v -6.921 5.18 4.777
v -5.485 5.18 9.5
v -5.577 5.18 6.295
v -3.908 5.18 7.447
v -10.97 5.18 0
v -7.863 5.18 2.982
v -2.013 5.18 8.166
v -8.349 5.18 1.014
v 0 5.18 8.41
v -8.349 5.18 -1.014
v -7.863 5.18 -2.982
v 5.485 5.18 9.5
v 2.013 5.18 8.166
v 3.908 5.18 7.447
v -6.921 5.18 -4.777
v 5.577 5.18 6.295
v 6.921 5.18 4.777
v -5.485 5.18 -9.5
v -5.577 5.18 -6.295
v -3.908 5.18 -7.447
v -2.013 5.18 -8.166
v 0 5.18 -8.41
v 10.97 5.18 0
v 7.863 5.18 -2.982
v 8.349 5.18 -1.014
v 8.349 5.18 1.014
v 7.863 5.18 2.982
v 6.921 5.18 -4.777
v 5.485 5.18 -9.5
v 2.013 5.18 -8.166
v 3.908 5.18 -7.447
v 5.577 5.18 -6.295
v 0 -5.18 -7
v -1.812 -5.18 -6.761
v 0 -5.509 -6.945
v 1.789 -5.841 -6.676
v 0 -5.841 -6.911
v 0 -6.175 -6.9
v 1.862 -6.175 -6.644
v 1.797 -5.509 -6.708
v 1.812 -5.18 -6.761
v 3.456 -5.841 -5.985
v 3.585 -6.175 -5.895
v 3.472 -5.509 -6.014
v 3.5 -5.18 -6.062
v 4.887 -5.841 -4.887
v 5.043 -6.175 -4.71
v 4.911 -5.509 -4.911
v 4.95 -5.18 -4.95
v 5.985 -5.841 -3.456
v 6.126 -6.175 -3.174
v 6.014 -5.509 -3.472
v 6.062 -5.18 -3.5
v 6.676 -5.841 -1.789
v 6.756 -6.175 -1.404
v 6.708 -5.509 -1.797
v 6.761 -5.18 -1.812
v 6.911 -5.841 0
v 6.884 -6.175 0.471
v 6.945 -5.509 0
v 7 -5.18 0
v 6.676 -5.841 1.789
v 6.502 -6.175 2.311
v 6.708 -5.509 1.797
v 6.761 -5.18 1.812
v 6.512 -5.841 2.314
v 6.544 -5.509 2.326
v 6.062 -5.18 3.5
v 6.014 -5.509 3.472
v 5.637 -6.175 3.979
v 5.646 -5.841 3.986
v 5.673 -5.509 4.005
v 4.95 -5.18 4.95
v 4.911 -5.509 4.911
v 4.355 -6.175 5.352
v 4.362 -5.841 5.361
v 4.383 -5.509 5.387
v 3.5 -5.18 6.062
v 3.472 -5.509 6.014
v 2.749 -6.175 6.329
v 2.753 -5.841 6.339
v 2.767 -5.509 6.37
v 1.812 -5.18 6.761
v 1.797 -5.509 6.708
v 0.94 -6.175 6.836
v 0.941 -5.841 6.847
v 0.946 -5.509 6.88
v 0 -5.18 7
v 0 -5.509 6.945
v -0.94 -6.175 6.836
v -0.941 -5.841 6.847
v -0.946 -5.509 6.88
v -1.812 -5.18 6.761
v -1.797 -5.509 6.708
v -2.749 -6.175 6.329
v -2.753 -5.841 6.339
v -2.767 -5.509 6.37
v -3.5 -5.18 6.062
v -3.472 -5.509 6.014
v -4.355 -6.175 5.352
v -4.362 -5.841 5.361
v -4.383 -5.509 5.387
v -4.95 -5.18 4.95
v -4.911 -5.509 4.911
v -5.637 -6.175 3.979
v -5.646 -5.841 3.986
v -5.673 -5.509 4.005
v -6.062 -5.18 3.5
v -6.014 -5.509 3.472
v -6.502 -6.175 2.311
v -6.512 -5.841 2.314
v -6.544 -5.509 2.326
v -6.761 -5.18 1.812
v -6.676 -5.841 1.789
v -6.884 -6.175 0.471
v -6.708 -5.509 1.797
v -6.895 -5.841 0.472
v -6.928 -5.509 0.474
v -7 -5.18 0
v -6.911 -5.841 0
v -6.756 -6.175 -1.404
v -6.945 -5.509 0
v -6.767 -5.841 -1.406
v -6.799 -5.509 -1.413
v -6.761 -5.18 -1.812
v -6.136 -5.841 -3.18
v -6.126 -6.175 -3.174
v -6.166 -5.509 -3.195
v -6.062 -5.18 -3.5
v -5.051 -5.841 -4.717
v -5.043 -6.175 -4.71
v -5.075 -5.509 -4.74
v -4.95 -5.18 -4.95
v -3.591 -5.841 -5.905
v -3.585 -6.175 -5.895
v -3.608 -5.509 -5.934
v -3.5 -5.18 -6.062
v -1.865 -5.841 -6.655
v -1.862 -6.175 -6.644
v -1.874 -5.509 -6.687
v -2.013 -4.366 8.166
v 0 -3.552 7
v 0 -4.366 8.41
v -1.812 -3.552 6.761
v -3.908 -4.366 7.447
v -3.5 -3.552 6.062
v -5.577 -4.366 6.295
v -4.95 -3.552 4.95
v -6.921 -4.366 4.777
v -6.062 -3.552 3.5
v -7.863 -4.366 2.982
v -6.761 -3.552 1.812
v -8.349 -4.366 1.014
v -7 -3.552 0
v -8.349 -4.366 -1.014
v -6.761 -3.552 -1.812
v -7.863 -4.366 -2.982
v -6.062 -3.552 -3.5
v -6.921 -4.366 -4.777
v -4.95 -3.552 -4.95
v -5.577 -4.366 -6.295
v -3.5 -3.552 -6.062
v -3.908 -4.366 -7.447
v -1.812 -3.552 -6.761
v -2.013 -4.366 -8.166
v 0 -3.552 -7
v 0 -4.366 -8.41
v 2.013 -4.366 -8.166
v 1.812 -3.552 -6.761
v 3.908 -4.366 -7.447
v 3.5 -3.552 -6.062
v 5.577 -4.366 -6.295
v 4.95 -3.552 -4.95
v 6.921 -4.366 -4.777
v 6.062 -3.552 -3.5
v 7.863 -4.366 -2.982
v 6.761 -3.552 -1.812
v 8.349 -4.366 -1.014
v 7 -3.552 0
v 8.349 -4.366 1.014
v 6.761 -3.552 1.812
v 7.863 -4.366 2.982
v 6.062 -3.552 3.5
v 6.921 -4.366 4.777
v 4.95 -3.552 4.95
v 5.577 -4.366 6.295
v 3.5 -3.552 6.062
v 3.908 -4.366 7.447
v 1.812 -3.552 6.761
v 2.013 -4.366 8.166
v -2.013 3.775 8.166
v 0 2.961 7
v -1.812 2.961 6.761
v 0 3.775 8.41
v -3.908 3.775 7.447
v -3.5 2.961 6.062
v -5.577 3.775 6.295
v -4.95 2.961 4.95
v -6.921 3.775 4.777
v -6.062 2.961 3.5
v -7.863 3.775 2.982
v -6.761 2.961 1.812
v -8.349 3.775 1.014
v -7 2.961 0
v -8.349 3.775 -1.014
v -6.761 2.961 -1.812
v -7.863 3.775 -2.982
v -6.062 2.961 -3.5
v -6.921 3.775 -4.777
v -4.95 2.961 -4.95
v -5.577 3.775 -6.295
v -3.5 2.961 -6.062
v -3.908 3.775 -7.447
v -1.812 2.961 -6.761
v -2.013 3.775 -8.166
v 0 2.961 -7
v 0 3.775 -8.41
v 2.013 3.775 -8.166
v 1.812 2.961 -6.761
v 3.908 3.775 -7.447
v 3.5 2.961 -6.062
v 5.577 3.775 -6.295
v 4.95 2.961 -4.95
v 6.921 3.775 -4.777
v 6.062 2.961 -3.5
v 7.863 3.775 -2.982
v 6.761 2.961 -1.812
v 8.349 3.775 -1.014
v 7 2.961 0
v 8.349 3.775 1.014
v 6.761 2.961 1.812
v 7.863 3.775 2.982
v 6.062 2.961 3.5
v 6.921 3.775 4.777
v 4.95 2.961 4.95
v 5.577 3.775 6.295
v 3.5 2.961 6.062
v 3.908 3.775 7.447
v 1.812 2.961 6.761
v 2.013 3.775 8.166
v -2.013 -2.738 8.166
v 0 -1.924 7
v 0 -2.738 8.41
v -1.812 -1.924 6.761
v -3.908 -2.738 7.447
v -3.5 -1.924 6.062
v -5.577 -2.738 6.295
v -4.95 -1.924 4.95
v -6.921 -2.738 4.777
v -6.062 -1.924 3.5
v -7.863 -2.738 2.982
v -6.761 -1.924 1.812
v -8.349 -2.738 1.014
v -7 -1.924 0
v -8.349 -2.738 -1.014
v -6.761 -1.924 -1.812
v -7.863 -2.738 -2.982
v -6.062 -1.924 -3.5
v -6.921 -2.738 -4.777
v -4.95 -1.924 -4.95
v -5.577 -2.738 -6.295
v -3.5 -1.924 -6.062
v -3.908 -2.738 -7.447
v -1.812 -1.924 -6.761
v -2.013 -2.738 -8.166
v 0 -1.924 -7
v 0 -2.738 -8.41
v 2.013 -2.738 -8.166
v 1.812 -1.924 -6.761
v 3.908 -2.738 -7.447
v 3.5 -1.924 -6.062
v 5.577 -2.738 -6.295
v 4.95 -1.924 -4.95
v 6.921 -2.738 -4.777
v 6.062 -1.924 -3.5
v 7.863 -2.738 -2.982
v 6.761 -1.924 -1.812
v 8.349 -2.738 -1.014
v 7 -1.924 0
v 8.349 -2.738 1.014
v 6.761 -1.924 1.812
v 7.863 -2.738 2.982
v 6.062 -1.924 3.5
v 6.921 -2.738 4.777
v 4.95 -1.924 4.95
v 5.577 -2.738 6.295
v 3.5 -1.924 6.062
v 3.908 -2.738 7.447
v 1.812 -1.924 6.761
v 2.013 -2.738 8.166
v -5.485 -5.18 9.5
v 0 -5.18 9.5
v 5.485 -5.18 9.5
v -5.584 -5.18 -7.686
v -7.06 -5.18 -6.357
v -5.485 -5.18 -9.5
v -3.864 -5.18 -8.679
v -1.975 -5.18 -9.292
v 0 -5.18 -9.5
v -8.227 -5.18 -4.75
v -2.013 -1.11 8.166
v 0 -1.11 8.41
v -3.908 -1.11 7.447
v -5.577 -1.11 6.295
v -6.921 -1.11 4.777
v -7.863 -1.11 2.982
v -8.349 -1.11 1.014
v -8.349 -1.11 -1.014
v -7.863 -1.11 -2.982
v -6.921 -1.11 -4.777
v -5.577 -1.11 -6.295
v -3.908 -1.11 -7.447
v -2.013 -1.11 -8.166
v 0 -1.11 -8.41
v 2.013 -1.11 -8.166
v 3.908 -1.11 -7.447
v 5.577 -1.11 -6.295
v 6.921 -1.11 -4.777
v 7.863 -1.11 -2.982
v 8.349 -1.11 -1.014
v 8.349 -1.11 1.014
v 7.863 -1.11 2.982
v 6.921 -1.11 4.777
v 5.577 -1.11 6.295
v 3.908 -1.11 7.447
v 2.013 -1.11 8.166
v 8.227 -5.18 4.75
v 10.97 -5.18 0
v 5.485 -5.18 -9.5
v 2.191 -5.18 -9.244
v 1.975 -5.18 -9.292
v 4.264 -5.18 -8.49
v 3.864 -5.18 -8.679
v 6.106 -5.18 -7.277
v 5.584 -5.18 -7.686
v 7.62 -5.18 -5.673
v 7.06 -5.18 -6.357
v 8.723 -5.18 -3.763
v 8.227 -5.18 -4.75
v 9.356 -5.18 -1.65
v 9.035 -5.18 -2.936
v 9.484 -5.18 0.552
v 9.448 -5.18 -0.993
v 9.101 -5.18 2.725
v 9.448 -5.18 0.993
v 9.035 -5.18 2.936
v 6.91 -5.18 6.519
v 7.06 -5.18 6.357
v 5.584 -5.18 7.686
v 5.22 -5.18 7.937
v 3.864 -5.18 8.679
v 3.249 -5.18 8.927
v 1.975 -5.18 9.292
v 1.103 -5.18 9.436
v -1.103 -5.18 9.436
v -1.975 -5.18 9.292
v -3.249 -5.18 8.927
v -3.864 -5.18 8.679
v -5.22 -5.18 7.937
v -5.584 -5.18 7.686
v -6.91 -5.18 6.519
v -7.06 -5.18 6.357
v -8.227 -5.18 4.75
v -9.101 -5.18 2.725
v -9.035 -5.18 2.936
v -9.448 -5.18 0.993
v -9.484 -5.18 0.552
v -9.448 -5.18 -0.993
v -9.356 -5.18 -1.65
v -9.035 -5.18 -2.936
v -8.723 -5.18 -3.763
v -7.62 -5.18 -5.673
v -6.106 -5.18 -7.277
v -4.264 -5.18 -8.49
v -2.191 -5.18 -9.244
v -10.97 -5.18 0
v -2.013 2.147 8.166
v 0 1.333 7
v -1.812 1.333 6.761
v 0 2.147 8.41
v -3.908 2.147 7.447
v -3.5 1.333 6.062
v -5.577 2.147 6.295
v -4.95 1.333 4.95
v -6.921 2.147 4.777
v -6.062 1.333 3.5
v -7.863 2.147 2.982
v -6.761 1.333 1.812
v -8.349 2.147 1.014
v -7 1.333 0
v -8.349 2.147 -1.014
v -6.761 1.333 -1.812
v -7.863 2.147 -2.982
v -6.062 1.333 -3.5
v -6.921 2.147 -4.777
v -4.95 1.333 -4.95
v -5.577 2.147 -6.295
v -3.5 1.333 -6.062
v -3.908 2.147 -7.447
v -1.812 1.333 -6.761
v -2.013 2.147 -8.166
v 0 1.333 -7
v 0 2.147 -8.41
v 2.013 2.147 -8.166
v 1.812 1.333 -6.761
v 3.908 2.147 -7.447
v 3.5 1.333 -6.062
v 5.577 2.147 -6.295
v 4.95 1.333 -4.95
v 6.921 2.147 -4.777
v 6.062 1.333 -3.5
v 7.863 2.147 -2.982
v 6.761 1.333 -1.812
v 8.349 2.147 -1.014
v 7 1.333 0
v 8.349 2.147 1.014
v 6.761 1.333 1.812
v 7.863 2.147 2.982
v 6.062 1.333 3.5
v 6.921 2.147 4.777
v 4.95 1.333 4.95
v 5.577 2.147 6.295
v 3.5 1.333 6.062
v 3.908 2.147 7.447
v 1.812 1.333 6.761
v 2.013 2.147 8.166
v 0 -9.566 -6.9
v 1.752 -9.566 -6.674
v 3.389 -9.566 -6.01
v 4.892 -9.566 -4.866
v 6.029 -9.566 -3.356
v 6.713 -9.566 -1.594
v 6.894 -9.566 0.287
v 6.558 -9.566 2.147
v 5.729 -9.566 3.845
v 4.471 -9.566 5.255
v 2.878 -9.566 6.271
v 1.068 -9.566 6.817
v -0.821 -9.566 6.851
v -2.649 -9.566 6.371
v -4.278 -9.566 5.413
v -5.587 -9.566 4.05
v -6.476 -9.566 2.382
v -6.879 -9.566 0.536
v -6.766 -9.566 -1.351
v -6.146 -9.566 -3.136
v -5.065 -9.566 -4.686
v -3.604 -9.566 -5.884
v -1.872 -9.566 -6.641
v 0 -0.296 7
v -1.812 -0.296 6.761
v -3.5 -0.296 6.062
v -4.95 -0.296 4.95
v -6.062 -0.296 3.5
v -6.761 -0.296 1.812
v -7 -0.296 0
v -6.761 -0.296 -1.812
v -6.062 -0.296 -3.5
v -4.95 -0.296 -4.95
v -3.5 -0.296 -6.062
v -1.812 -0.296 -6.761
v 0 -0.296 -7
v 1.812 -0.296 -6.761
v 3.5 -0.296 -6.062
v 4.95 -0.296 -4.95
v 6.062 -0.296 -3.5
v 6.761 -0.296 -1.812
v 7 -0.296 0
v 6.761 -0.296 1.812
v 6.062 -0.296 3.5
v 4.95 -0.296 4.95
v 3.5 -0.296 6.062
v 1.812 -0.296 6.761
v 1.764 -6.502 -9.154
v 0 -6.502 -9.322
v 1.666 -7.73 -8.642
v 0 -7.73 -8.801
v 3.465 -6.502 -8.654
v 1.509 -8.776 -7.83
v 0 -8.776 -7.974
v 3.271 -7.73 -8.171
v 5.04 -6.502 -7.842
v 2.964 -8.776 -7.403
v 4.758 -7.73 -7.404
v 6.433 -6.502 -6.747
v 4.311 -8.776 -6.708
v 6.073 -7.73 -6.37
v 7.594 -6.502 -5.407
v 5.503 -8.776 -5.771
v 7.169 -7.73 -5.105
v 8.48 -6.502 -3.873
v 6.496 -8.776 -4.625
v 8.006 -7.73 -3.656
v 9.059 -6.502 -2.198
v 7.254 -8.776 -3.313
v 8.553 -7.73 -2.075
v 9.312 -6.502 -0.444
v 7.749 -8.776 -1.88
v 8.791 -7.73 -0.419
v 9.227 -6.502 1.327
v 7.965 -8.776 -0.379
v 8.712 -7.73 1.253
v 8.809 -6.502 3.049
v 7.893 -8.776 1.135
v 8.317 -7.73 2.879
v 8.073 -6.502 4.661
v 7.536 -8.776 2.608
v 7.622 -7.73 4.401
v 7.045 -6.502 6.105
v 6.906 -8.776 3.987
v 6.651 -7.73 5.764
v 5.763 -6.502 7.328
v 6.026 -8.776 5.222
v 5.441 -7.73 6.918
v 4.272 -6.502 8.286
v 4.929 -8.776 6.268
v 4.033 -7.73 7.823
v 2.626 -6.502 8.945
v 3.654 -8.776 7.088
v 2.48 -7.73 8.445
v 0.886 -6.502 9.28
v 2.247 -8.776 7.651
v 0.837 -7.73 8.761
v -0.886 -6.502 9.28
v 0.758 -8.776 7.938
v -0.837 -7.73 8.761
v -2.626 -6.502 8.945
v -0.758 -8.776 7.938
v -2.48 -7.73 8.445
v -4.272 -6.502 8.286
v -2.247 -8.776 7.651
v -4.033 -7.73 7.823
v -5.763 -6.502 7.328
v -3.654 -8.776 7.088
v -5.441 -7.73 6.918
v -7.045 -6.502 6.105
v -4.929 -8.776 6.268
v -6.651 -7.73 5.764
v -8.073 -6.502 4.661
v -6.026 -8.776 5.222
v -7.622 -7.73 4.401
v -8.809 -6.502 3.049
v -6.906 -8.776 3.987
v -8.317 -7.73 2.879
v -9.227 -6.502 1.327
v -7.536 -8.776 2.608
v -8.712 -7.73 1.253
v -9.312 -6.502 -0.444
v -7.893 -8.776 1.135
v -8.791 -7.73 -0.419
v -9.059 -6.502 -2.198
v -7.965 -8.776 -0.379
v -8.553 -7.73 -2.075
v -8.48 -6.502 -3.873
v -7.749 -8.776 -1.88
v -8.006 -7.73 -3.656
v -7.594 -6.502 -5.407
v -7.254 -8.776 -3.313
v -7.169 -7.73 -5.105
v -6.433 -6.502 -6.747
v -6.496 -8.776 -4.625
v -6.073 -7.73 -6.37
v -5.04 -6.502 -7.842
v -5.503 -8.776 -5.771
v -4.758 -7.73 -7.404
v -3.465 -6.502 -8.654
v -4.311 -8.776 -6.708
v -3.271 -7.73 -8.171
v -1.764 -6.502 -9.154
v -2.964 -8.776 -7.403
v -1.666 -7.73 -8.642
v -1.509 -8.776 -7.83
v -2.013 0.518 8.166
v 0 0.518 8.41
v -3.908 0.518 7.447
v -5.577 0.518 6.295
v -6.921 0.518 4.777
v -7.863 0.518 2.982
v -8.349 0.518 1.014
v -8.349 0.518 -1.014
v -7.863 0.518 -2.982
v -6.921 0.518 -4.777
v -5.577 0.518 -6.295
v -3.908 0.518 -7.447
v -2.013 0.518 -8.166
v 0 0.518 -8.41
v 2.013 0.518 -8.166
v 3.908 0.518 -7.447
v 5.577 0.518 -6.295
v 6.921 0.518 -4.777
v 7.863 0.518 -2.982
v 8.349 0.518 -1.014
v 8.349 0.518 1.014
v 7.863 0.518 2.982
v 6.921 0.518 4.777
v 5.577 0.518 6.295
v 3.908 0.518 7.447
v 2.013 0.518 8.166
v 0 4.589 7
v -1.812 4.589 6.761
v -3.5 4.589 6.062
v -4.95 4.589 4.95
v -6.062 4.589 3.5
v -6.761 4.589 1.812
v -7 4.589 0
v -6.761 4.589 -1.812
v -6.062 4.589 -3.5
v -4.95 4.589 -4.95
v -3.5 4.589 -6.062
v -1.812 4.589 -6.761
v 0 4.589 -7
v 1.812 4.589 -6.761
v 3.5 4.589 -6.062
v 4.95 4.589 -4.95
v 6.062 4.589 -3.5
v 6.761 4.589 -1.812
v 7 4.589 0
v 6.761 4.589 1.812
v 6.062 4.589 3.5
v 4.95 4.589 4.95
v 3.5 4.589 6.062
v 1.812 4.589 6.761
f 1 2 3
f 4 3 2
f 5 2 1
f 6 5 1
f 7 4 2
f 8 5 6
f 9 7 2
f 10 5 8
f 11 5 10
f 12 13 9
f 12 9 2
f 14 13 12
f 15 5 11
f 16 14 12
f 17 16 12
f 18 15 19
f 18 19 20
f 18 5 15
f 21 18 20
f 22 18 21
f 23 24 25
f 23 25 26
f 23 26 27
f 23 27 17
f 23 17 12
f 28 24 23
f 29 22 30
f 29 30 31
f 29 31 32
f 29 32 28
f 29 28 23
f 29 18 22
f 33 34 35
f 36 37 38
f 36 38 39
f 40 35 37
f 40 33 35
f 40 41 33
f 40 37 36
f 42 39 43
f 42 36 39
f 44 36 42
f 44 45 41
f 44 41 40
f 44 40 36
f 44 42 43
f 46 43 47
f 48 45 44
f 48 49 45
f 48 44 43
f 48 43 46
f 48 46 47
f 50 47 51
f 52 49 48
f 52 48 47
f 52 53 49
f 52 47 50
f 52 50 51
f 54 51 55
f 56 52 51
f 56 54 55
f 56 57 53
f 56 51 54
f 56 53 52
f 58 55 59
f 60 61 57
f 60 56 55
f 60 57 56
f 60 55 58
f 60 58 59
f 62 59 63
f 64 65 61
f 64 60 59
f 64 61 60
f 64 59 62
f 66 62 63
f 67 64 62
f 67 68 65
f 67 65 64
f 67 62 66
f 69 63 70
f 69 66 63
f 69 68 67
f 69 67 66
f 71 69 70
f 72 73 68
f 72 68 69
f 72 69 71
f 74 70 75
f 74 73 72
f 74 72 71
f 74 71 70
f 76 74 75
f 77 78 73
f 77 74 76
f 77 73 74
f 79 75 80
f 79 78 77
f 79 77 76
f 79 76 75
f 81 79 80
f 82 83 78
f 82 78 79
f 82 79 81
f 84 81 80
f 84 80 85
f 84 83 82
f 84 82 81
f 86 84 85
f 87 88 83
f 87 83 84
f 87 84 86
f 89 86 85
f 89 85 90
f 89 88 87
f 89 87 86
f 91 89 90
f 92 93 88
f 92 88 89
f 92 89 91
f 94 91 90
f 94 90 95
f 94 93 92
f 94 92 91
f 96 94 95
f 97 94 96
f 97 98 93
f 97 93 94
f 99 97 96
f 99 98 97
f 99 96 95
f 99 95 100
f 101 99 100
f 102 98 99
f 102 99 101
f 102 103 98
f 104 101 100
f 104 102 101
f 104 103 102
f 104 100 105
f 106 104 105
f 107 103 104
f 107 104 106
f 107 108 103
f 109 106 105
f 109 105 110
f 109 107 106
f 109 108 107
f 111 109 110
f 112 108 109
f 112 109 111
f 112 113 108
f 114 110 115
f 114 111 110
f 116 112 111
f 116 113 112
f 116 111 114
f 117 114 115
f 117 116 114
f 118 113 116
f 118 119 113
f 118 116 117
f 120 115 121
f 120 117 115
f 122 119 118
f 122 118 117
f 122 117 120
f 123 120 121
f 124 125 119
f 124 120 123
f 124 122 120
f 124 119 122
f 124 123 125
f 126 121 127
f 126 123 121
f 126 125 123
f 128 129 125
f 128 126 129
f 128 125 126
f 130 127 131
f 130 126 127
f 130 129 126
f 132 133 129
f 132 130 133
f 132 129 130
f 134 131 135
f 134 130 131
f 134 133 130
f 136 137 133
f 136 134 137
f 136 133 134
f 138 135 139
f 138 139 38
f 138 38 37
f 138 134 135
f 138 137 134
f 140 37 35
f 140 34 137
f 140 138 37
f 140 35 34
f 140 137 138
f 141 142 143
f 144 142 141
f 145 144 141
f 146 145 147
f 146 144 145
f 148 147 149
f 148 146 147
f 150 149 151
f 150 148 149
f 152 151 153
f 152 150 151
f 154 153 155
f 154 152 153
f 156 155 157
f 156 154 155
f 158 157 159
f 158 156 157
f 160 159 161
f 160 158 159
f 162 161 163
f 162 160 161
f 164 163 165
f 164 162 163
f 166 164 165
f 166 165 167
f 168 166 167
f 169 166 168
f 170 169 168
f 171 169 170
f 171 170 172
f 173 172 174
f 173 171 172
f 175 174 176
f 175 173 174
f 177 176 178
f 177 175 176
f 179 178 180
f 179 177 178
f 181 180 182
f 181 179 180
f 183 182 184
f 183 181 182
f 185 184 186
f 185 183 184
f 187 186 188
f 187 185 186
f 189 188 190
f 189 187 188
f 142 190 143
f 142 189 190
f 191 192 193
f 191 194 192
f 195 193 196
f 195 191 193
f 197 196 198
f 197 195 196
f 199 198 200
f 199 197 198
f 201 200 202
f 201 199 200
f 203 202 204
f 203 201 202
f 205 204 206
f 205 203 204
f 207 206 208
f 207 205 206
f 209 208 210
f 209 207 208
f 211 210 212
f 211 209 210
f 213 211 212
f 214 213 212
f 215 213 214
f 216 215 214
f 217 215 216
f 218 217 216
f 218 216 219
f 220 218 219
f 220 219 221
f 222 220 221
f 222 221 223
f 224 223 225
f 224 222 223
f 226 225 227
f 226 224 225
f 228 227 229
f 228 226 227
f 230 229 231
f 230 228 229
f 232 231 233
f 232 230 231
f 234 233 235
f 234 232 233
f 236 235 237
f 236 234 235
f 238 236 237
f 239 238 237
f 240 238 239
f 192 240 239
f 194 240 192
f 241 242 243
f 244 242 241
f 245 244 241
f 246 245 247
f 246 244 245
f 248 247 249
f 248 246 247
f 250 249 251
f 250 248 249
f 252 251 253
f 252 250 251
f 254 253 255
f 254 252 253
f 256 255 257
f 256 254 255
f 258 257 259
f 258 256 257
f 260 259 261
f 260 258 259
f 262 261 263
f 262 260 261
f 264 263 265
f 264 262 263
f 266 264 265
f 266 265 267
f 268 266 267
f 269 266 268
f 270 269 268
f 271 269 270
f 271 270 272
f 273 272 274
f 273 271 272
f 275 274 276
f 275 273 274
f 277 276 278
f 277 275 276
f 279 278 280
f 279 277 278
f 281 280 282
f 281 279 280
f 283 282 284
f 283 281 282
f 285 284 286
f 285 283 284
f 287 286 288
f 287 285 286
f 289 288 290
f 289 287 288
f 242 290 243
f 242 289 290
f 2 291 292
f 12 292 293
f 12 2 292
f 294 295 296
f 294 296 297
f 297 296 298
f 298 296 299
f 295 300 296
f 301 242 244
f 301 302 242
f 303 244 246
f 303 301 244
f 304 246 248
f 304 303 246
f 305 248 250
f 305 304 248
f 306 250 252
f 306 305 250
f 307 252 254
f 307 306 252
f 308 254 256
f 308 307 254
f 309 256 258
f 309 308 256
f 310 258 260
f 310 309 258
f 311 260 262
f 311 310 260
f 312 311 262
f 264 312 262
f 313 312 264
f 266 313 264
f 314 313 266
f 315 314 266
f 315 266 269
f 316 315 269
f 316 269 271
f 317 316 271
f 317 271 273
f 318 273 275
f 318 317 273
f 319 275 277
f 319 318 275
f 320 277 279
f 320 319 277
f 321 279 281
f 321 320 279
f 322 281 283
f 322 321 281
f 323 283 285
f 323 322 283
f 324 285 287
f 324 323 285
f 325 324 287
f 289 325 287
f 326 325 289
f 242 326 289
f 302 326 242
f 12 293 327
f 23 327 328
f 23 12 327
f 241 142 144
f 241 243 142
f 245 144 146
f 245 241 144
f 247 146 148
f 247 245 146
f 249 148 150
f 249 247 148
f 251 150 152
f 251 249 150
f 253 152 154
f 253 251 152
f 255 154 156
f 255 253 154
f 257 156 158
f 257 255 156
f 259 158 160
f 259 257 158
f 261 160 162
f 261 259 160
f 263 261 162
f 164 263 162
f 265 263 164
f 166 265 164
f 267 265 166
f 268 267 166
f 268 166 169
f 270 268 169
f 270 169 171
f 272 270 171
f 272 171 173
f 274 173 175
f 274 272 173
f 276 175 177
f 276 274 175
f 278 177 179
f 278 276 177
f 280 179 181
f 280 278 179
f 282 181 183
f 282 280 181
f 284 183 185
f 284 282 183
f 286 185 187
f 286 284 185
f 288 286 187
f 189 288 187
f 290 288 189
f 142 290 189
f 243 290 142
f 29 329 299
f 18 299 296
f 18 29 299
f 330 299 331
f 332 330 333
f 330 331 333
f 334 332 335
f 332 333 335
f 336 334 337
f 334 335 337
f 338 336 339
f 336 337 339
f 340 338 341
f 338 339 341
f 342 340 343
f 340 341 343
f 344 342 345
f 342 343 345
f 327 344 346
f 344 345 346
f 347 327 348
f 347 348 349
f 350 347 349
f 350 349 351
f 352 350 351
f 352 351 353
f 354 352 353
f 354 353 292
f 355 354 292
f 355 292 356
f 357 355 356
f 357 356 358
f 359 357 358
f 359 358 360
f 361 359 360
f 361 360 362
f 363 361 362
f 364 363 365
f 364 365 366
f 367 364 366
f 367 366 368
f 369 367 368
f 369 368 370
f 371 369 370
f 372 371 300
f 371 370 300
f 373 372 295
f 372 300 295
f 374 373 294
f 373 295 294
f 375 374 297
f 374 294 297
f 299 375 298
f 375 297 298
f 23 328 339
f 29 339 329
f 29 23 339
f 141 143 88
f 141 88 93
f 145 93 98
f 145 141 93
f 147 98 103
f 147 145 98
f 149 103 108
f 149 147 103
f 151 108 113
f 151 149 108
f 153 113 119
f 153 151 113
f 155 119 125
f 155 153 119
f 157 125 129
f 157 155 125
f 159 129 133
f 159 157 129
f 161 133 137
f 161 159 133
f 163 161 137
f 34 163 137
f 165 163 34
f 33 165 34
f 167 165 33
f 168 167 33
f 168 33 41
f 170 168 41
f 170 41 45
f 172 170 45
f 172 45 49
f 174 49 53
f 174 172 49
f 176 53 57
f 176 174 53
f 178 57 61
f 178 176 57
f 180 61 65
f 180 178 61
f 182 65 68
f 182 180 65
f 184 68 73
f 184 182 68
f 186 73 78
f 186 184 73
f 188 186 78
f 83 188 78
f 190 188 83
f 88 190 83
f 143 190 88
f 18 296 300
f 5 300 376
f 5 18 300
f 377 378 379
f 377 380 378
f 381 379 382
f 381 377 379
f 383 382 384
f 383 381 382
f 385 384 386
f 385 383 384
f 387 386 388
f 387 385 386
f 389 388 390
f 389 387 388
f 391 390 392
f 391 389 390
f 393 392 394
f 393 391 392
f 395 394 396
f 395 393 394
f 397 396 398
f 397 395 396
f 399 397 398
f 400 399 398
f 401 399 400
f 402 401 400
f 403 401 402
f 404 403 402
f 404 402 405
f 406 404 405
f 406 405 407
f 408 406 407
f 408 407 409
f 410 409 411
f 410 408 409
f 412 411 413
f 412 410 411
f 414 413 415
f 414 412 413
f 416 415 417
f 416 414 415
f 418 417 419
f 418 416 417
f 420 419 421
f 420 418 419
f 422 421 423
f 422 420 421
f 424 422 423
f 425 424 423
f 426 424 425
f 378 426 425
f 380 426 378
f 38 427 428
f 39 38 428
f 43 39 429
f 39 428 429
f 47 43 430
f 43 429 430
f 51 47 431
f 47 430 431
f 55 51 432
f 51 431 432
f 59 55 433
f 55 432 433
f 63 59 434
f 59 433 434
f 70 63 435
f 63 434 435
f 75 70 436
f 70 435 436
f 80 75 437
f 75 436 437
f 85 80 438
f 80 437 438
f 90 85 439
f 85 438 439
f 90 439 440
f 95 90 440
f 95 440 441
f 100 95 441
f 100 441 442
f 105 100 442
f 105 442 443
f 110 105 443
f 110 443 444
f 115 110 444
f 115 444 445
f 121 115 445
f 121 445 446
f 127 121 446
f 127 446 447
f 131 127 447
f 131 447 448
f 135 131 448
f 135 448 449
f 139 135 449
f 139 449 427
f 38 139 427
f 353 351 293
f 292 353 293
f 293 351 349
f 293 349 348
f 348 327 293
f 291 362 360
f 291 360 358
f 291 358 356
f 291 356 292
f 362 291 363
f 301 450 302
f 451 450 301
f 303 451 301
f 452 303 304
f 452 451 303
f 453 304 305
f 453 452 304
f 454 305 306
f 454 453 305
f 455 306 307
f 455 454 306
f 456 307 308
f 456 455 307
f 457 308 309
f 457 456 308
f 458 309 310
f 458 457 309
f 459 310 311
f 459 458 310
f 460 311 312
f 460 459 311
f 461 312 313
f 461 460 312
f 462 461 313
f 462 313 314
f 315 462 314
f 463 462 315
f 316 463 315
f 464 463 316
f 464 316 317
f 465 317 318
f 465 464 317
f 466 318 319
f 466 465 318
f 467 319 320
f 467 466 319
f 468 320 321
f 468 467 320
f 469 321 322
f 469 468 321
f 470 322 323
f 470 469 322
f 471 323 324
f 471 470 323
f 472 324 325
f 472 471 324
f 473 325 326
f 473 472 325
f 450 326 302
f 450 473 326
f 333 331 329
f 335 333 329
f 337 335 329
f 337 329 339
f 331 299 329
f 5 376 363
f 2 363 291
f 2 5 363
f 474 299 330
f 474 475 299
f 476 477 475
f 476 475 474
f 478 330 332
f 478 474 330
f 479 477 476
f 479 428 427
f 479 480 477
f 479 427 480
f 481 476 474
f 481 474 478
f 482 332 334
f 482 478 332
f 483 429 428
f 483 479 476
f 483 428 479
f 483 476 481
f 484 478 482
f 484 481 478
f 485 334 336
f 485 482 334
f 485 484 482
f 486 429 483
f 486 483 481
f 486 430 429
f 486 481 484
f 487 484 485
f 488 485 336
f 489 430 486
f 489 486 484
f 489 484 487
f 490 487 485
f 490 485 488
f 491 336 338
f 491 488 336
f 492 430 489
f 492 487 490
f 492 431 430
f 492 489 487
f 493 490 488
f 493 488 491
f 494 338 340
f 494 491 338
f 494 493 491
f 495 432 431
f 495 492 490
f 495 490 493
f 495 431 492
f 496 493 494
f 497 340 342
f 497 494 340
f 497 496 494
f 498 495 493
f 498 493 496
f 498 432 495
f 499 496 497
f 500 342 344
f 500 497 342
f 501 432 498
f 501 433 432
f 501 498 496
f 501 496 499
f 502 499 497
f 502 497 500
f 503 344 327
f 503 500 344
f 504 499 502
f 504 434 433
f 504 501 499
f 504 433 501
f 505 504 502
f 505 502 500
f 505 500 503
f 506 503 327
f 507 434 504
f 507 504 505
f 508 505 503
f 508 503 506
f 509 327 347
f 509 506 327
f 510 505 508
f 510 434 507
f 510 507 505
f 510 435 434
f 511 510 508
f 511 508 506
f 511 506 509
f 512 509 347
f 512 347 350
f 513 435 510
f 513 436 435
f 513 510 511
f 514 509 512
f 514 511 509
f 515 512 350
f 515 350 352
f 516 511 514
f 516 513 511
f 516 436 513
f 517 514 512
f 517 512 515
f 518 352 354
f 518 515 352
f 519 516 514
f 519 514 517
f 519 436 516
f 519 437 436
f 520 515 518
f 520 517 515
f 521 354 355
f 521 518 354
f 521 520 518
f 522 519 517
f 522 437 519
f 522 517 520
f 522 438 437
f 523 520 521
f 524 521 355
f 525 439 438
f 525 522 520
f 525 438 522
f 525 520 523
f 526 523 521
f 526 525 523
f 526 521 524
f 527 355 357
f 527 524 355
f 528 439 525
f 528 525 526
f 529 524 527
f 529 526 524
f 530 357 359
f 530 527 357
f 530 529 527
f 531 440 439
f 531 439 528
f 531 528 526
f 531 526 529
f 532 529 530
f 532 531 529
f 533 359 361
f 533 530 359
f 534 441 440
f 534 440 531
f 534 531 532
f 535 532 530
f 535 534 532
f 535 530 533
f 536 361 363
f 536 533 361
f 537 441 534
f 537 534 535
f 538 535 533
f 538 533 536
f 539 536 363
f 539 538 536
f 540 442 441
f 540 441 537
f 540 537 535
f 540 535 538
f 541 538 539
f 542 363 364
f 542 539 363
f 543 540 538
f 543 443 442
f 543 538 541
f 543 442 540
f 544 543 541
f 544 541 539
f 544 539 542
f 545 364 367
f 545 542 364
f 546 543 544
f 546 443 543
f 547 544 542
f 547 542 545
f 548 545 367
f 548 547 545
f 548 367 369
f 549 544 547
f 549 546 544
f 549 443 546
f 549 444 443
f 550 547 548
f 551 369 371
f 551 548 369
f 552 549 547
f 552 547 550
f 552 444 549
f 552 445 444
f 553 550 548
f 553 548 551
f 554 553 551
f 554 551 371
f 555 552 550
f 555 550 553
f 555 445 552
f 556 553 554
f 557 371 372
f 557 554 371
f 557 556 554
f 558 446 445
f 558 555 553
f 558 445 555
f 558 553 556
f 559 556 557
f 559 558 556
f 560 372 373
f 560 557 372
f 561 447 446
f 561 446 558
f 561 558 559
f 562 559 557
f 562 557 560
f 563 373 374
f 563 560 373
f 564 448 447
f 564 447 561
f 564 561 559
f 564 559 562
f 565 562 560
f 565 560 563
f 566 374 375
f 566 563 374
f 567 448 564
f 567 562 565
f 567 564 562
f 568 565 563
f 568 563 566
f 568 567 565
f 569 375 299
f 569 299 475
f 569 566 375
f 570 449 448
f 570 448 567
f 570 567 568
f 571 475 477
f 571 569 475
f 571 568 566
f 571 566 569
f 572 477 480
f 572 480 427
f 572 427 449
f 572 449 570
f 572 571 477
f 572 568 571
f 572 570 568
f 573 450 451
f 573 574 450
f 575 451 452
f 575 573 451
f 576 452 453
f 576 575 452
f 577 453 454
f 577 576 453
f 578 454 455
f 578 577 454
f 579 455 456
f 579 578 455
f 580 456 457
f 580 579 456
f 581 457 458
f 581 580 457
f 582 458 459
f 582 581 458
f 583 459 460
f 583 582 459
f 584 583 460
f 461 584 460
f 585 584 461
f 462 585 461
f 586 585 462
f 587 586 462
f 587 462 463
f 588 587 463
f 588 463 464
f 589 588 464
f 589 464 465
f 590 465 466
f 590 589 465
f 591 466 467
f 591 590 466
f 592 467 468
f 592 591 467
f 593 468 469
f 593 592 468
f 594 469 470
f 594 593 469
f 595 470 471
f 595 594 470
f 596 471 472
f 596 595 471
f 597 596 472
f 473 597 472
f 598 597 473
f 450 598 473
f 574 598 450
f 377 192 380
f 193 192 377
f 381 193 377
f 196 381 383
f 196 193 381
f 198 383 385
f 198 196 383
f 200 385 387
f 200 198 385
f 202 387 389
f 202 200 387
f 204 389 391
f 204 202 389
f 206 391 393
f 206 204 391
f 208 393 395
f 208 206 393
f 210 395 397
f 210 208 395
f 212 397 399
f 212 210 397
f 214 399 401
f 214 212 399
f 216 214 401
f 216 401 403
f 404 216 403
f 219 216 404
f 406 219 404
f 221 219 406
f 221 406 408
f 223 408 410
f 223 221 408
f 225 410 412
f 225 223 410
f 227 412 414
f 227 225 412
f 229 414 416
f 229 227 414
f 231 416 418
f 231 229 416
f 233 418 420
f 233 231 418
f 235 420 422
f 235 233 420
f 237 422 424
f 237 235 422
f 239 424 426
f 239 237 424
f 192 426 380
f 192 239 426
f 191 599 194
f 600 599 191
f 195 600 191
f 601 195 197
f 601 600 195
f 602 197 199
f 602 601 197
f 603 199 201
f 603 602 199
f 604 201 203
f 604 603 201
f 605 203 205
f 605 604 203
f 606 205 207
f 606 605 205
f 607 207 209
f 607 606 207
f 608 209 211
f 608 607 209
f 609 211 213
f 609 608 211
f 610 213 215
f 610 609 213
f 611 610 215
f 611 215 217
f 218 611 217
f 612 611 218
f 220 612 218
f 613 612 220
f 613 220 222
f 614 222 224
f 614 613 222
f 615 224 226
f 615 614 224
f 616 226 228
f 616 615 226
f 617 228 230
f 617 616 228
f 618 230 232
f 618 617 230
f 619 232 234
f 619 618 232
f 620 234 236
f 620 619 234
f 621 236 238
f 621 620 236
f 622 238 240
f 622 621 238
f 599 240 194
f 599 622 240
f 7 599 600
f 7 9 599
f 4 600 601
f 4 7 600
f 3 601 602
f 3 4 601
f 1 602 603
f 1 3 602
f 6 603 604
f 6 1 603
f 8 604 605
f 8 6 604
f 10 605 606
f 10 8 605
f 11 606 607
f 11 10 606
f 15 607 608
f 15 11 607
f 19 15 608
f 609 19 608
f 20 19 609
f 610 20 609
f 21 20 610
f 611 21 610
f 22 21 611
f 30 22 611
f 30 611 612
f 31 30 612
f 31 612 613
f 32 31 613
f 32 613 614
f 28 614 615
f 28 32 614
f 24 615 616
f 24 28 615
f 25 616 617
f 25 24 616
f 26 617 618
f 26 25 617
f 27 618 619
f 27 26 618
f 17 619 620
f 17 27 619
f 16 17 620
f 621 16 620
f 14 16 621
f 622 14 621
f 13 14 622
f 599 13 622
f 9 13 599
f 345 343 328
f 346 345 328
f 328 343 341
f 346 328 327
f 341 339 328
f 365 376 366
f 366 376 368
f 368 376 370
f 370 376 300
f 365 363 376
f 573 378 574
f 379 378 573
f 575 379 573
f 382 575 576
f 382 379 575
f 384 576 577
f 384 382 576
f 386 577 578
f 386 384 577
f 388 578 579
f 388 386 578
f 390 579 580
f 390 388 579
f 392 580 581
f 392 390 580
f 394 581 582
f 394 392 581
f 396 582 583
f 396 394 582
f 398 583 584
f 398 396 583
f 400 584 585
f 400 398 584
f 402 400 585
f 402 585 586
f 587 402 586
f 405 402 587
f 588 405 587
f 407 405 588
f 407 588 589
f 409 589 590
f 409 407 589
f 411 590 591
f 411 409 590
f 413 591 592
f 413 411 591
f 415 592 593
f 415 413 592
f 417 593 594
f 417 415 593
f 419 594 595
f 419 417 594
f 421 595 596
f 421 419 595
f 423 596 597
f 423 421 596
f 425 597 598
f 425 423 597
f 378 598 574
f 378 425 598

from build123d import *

# Parameters (mm, degrees)
BOSS_EXTRUDE1_DEPTH = 5.18
SKETCH3_R           = 9.5
BOSS_EXTRUDE2_DEPTH = 5
FILLET3_R           = 5
SKETCH4_R           = 6.9
CUT_EXTRUDE1_DEPTH  = 5
FILLET4_R           = 5


# Some blends are built 0.0001 mm under size
with BuildPart() as part:
    # Sketch1 → Boss-Extrude1 (new, symmetric)
    with BuildSketch(Plane(origin=(0, 0, 0), x_dir=(1, 0, 0), z_dir=(0, 1, 0))):
        Polygon((10.969655115, 0), (5.484827557, 9.5), (-5.484827557, 9.5), (-10.969655115, 0), (-5.484827557, -9.5), (5.484827557, -9.5), align=None)
    extrude(amount=BOSS_EXTRUDE1_DEPTH, both=True)

    # Sketch2 → Cut-Revolve1 (revolve, cut)
    with BuildSketch(Plane(origin=(0, 0, 0), x_dir=(0, 0, -1), z_dir=(1, 0, 0))):
        Polygon((-8.41, 5.18), (0, 5.18), (0, -5.18), (-7, -5.18), (-8.41, -4.36593612), (-7, -3.551872241), (-8.41, -2.737808361), (-7, -1.923744482), (-8.41, -1.109680602), (-7, -0.295616723), (-8.41, 0.518447157), (-7, 1.332511036), (-8.41, 2.146574916), (-7, 2.960638796), (-8.41, 3.774702675), (-7, 4.588766555), align=None)
    revolve(axis=Axis((0, 5.18, 0), (0, -1, 0)), mode=Mode.SUBTRACT)

    # Sketch3 → Boss-Extrude2 (add)
    with BuildSketch(Plane.XZ.offset(5.18)):
        with Locations(Location((0, 0, 0), (0, 0, 270))):
            Circle(SKETCH3_R)
    extrude(amount=BOSS_EXTRUDE2_DEPTH)

    # Fillet3
    fillet3_edges = [part.edges().sort_by_distance(p)[0] for p in [
        (0, -10.18, 9.5),
    ]]
    fillet(fillet3_edges, radius=FILLET3_R - 0.0001)  # a hair under: the kernel refuses the full size

    # Sketch4 → Cut-Extrude1 (cut)
    with BuildSketch(Plane.XZ.offset(10.18)):
        with Locations(Location((0, 0, 0), (0, 0, 270))):
            Circle(SKETCH4_R)
    extrude(amount=-CUT_EXTRUDE1_DEPTH, mode=Mode.SUBTRACT)

    # Fillet4
    # the kernel refuses this fillet: 5 mm, written as the material it takes off along each edge
    with BuildSketch(Plane(origin=(0, -5.18, 0), x_dir=(0, 0, -1), z_dir=(-1, 0, 0))) as fillet4_piece_1:
        with BuildLine():
            CenterArc((11.9, 0.994987437), FILLET4_R, 180, 11.478340955)
            Line((7, 0), (6.9, 0))
            Line((6.9, 0), (6.9, 0.994987437))
        make_face()
    revolve(axis=Axis((0, -5.18, 0), (0, -1, 0)), mode=Mode.SUBTRACT)


solid = part.part
